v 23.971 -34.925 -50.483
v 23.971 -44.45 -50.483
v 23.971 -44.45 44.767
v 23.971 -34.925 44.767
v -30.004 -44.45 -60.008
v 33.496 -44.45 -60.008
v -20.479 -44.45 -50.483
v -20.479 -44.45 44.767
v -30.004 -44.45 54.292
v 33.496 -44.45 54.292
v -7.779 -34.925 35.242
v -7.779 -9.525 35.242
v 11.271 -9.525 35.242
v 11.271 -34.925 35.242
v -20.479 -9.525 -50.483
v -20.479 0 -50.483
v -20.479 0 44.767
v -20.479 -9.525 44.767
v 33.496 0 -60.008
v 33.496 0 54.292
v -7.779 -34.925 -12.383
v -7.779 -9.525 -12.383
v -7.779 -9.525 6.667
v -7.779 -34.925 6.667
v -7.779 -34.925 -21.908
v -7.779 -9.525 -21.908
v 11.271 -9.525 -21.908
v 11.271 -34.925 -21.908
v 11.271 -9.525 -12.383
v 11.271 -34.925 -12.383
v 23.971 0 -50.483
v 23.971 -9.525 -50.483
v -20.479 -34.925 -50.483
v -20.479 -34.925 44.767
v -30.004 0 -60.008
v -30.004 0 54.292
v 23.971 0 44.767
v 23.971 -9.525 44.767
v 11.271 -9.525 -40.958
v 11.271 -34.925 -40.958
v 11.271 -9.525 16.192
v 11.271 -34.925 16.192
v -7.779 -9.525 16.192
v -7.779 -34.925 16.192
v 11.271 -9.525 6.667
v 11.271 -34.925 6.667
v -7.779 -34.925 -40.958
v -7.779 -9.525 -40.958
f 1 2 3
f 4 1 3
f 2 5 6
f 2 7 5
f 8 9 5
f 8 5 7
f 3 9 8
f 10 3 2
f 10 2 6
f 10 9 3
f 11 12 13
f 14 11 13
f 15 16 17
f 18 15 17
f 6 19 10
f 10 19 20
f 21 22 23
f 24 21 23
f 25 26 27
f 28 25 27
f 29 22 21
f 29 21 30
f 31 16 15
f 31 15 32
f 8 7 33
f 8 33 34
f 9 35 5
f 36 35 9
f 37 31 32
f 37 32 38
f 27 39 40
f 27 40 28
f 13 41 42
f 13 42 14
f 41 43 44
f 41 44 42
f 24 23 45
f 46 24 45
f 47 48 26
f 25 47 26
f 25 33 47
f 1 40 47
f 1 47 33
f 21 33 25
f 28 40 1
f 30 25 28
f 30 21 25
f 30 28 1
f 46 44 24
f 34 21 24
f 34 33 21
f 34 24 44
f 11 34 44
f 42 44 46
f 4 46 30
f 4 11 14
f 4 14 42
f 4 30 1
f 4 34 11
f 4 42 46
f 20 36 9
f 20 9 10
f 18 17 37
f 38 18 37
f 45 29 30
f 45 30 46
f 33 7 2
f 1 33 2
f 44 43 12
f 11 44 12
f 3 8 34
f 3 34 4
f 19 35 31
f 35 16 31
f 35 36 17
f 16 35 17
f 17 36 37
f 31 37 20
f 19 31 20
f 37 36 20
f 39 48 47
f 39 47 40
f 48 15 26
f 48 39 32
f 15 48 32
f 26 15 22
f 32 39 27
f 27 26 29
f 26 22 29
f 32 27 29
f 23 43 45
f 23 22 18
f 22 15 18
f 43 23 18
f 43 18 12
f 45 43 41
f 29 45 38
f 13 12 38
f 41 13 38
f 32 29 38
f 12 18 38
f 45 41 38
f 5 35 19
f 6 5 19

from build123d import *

# Parameters (mm, degrees)
F0_W     = 63.5
F0_H     = 114.3
F0_W_2   = 44.45
F0_H_2   = 95.25
F0_W_3   = 19.05
F0_H_3   = 19.05
F1_DEPTH = 44.45
F2_DEPTH = 44.451
F3_DEPTH = 9.525
F4_W     = 44.45
F4_H     = 95.25
F4_W_2   = 19.05
F4_H_2   = 19.05
F5_DEPTH = 9.525


with BuildPart() as f1:
    # F0 (on Front) → F1 (new body)
    with BuildSketch(Plane.XZ):
        with Locations((1.7462493032, -2.8575013936)):
            Rectangle(F0_W, F0_H)
        with Locations((1.7462493032, -2.8575013936)):
            Rectangle(F0_W_2, F0_H_2, mode=Mode.SUBTRACT)
        with Locations((1.7462493032, -2.8575013936)):
            Rectangle(F0_W_2, F0_H_2)
        with Locations((1.7462493032, -31.4325013936)):
            Rectangle(F0_W_3, F0_H_3, mode=Mode.SUBTRACT)
        with Locations((1.7462493032, -2.8575013936)):
            Rectangle(F0_W_3, F0_H_3, mode=Mode.SUBTRACT)
        with Locations((1.7462493032, 25.7174986064)):
            Rectangle(F0_W_3, F0_H_3, mode=Mode.SUBTRACT)
        with Locations((1.7462493032, -31.4325013936)):
            Rectangle(F0_W_3, F0_H_3)
        with Locations((1.7462493032, 25.7174986064)):
            Rectangle(F0_W_3, F0_H_3)
        with Locations((1.7462493032, -2.8575013936)):
            Rectangle(F0_W_3, F0_H_3)
    extrude(amount=F1_DEPTH)

    # F0 (on Front) → F2 (cut, through all)
    with BuildSketch(Plane.XZ):
        with Locations((1.7462493032, 25.7174986064)):
            Rectangle(F0_W_3, F0_H_3)
        with Locations((1.7462493032, -2.8575013936)):
            Rectangle(F0_W_3, F0_H_3)
        with Locations((1.7462493032, -31.4325013936)):
            Rectangle(F0_W_3, F0_H_3)
    extrude(amount=F2_DEPTH, mode=Mode.SUBTRACT)

    # F0 (on Front) → F3 (cut)
    with BuildSketch(Plane.XZ):
        with Locations((1.7462493032, -2.8575013936)):
            Rectangle(F0_W_2, F0_H_2)
        with Locations((1.7462493032, -31.4325013936)):
            Rectangle(F0_W_3, F0_H_3, mode=Mode.SUBTRACT)
        with Locations((1.7462493032, -2.8575013936)):
            Rectangle(F0_W_3, F0_H_3, mode=Mode.SUBTRACT)
        with Locations((1.7462493032, 25.7174986064)):
            Rectangle(F0_W_3, F0_H_3, mode=Mode.SUBTRACT)
    extrude(amount=F3_DEPTH, mode=Mode.SUBTRACT)

    # F4 (on face) → F5 (cut)
    with BuildSketch(Plane.XZ.offset(44.45)):
        with Locations((1.7462493032, -2.8575013936)):
            Rectangle(F4_W, F4_H)
        with Locations((1.7462493032, -31.4325013936)):
            Rectangle(F4_W_2, F4_H_2, mode=Mode.SUBTRACT)
        with Locations((1.7462493032, -2.8575013936)):
            Rectangle(F4_W_2, F4_H_2, mode=Mode.SUBTRACT)
        with Locations((1.7462493032, 25.7174986064)):
            Rectangle(F4_W_2, F4_H_2, mode=Mode.SUBTRACT)
    extrude(amount=-F5_DEPTH, mode=Mode.SUBTRACT)


solid = f1.part
